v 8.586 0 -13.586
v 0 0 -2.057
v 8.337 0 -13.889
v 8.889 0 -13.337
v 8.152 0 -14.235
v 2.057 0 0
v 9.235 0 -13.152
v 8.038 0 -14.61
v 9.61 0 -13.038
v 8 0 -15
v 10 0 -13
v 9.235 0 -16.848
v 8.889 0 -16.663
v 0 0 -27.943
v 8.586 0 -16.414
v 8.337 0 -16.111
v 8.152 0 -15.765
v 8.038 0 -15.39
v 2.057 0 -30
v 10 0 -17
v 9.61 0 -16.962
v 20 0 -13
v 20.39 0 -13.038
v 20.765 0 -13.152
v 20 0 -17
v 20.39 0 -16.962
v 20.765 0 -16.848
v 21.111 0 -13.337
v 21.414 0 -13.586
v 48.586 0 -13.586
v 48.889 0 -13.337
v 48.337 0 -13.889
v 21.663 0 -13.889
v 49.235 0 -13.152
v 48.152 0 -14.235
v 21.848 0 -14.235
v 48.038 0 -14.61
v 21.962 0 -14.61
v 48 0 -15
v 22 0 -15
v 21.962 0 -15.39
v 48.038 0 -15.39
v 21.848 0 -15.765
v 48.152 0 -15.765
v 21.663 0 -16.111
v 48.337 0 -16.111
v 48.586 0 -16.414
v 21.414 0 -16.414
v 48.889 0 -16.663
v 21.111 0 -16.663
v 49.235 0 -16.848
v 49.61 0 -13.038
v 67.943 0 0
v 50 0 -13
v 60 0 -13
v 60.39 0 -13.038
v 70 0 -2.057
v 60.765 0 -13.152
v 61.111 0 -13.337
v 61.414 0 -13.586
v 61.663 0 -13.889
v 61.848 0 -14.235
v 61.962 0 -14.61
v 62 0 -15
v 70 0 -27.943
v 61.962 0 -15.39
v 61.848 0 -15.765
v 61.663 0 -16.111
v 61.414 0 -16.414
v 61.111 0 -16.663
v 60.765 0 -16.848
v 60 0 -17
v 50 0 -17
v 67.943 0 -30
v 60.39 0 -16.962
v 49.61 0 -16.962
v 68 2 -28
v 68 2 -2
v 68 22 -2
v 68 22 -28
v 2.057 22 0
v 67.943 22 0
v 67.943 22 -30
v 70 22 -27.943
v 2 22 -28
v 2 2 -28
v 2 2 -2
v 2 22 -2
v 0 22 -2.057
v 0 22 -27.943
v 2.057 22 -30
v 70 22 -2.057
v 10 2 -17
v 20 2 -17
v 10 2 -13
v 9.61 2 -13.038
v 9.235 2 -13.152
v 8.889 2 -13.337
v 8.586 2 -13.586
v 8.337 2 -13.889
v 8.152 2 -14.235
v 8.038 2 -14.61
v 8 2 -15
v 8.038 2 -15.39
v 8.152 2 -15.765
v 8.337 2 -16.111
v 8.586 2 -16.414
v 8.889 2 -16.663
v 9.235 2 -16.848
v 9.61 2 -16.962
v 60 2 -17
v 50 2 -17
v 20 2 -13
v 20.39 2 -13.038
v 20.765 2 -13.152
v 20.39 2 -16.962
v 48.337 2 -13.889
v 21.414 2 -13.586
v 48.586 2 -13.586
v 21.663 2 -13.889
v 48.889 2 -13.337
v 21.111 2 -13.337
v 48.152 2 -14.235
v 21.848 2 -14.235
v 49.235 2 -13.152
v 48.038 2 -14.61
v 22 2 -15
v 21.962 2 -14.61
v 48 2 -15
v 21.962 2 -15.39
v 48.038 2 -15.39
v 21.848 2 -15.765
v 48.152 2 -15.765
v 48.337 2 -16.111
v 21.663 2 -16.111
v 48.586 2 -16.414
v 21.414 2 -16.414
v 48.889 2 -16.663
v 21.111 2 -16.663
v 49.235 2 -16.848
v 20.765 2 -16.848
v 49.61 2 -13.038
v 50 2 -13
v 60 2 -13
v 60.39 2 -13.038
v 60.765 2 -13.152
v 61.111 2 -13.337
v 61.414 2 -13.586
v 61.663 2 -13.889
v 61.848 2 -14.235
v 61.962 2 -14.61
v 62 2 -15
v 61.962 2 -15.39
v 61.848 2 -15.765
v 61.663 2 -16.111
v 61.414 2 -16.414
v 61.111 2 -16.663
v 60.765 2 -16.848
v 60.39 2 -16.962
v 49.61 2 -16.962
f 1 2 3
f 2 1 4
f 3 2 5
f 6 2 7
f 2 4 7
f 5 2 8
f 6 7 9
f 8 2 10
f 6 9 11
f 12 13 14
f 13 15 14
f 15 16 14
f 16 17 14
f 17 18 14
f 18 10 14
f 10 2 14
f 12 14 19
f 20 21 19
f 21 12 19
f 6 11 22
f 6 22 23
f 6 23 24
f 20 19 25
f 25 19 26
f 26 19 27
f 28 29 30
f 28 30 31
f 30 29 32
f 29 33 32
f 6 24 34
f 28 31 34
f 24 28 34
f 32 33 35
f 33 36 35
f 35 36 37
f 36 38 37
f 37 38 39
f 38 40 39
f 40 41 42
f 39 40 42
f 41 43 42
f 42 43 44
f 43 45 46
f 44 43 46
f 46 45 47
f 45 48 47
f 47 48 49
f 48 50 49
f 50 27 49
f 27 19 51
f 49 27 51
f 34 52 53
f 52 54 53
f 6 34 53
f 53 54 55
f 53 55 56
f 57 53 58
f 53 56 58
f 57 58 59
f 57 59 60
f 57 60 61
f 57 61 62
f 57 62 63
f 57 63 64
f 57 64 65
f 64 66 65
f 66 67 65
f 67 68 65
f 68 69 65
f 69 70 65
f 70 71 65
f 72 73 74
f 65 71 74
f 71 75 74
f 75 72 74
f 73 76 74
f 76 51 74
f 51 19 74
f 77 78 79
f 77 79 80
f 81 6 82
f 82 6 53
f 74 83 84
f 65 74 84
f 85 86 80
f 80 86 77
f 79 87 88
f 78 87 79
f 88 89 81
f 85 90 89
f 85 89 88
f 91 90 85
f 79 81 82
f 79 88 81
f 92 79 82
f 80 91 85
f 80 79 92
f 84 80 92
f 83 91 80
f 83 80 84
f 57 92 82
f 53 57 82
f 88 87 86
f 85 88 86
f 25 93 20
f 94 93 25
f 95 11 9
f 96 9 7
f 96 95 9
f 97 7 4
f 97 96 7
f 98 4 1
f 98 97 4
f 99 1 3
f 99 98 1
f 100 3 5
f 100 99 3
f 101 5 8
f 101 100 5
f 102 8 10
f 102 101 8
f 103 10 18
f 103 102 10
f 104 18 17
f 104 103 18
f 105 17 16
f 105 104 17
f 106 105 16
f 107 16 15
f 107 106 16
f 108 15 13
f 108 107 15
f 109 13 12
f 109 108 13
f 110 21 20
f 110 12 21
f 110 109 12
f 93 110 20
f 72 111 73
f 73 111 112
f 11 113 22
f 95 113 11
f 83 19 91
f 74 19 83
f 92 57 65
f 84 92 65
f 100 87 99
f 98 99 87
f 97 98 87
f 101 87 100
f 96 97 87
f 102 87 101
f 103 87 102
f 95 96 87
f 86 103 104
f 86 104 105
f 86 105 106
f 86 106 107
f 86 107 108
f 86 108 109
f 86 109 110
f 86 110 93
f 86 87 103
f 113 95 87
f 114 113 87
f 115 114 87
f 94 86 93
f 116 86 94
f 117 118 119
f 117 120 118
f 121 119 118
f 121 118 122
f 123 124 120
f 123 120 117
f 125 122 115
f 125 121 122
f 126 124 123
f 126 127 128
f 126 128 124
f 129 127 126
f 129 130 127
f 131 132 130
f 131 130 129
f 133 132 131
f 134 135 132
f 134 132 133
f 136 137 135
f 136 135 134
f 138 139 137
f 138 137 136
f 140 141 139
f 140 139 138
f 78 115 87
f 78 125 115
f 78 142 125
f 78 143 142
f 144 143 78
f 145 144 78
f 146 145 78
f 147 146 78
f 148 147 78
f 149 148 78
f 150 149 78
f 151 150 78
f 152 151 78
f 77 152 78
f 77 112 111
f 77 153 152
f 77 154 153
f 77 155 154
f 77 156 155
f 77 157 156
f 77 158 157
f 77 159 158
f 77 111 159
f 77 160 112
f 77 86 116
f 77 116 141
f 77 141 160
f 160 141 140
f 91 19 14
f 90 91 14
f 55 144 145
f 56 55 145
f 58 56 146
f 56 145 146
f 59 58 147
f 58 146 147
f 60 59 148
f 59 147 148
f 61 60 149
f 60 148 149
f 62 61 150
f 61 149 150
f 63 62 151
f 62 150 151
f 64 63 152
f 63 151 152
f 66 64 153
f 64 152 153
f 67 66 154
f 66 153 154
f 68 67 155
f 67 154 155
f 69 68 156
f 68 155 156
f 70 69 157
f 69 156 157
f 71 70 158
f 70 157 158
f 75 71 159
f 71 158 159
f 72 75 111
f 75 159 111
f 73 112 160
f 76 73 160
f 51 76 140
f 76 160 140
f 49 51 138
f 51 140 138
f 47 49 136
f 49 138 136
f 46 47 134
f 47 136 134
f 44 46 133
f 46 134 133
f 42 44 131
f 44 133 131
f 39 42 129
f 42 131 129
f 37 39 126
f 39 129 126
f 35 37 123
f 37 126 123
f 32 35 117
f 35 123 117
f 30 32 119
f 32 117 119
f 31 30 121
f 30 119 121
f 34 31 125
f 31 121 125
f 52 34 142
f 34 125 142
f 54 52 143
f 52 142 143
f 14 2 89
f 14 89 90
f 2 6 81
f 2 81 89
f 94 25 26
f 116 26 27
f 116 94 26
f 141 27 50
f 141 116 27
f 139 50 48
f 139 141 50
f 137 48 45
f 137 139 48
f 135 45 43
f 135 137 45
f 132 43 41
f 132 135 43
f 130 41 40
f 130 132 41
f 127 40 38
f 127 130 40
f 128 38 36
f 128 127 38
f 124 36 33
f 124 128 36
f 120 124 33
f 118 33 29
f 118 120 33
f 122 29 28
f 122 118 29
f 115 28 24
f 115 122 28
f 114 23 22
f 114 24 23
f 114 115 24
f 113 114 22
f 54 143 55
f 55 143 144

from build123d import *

# Parameters (mm, degrees)
CROQUIS1_W              = 70
CROQUIS1_H              = 30
SALIENTE_EXTRUIR1_DEPTH = 22
VACIADO1_T              = -2
CORTAR_EXTRUIR1_DEPTH   = 22
CORTAR_EXTRUIR3_DEPTH   = 22


with BuildPart() as part:
    # Croquis1 → Saliente-Extruir1 (new body)
    with BuildSketch(Plane(origin=(0, 0, 0), x_dir=(1, 0, 0), z_dir=(0, 1, 0))):
        with Locations((35, 15)):
            Rectangle(CROQUIS1_W, CROQUIS1_H)
    extrude(amount=SALIENTE_EXTRUIR1_DEPTH)

    # Vaciado1
    vaciado1_openings = [part.faces().sort_by_distance(p)[0] for p in [
        (35, 22, -15),
    ]]
    offset(amount=VACIADO1_T, openings=vaciado1_openings, kind=Kind.INTERSECTION)

    # Croquis2 → Cortar-Extruir1 (cut)
    with BuildSketch(Plane(origin=(0, 2, 0), x_dir=(1, 0, 0), z_dir=(0, 1, 0))):
        with BuildLine():
            Line((60, 17), (50, 17))
            ThreePointArc((50, 17), (48, 15), (50, 13))
            Line((50, 13), (60, 13))
            ThreePointArc((60, 13), (62, 15), (60, 17))
        make_face()
        with BuildLine():
            Line((10, 17), (20, 17))
            ThreePointArc((20, 17), (22, 15), (20, 13))
            Line((20, 13), (10, 13))
            ThreePointArc((10, 13), (8, 15), (10, 17))
        make_face()
    extrude(amount=-CORTAR_EXTRUIR1_DEPTH, mode=Mode.SUBTRACT)

    # Croquis3 → Cortar-Extruir3 (cut)
    with BuildSketch(Plane(origin=(0, 22, 0), x_dir=(1, 0, 0), z_dir=(0, 1, 0))):
        Polygon((2.056887166, 0), (0, 2.056887166), (0, 0), align=None)
        Polygon((70, 0), (70, 2.056887166), (67.943112834, 0), align=None)
        Polygon((70, 30), (67.943112834, 30), (70, 27.943112834), align=None)
        Polygon((0, 30), (2.056887166, 30), (0, 27.943112834), align=None)
    extrude(amount=-CORTAR_EXTRUIR3_DEPTH, mode=Mode.SUBTRACT)


solid = part.part
